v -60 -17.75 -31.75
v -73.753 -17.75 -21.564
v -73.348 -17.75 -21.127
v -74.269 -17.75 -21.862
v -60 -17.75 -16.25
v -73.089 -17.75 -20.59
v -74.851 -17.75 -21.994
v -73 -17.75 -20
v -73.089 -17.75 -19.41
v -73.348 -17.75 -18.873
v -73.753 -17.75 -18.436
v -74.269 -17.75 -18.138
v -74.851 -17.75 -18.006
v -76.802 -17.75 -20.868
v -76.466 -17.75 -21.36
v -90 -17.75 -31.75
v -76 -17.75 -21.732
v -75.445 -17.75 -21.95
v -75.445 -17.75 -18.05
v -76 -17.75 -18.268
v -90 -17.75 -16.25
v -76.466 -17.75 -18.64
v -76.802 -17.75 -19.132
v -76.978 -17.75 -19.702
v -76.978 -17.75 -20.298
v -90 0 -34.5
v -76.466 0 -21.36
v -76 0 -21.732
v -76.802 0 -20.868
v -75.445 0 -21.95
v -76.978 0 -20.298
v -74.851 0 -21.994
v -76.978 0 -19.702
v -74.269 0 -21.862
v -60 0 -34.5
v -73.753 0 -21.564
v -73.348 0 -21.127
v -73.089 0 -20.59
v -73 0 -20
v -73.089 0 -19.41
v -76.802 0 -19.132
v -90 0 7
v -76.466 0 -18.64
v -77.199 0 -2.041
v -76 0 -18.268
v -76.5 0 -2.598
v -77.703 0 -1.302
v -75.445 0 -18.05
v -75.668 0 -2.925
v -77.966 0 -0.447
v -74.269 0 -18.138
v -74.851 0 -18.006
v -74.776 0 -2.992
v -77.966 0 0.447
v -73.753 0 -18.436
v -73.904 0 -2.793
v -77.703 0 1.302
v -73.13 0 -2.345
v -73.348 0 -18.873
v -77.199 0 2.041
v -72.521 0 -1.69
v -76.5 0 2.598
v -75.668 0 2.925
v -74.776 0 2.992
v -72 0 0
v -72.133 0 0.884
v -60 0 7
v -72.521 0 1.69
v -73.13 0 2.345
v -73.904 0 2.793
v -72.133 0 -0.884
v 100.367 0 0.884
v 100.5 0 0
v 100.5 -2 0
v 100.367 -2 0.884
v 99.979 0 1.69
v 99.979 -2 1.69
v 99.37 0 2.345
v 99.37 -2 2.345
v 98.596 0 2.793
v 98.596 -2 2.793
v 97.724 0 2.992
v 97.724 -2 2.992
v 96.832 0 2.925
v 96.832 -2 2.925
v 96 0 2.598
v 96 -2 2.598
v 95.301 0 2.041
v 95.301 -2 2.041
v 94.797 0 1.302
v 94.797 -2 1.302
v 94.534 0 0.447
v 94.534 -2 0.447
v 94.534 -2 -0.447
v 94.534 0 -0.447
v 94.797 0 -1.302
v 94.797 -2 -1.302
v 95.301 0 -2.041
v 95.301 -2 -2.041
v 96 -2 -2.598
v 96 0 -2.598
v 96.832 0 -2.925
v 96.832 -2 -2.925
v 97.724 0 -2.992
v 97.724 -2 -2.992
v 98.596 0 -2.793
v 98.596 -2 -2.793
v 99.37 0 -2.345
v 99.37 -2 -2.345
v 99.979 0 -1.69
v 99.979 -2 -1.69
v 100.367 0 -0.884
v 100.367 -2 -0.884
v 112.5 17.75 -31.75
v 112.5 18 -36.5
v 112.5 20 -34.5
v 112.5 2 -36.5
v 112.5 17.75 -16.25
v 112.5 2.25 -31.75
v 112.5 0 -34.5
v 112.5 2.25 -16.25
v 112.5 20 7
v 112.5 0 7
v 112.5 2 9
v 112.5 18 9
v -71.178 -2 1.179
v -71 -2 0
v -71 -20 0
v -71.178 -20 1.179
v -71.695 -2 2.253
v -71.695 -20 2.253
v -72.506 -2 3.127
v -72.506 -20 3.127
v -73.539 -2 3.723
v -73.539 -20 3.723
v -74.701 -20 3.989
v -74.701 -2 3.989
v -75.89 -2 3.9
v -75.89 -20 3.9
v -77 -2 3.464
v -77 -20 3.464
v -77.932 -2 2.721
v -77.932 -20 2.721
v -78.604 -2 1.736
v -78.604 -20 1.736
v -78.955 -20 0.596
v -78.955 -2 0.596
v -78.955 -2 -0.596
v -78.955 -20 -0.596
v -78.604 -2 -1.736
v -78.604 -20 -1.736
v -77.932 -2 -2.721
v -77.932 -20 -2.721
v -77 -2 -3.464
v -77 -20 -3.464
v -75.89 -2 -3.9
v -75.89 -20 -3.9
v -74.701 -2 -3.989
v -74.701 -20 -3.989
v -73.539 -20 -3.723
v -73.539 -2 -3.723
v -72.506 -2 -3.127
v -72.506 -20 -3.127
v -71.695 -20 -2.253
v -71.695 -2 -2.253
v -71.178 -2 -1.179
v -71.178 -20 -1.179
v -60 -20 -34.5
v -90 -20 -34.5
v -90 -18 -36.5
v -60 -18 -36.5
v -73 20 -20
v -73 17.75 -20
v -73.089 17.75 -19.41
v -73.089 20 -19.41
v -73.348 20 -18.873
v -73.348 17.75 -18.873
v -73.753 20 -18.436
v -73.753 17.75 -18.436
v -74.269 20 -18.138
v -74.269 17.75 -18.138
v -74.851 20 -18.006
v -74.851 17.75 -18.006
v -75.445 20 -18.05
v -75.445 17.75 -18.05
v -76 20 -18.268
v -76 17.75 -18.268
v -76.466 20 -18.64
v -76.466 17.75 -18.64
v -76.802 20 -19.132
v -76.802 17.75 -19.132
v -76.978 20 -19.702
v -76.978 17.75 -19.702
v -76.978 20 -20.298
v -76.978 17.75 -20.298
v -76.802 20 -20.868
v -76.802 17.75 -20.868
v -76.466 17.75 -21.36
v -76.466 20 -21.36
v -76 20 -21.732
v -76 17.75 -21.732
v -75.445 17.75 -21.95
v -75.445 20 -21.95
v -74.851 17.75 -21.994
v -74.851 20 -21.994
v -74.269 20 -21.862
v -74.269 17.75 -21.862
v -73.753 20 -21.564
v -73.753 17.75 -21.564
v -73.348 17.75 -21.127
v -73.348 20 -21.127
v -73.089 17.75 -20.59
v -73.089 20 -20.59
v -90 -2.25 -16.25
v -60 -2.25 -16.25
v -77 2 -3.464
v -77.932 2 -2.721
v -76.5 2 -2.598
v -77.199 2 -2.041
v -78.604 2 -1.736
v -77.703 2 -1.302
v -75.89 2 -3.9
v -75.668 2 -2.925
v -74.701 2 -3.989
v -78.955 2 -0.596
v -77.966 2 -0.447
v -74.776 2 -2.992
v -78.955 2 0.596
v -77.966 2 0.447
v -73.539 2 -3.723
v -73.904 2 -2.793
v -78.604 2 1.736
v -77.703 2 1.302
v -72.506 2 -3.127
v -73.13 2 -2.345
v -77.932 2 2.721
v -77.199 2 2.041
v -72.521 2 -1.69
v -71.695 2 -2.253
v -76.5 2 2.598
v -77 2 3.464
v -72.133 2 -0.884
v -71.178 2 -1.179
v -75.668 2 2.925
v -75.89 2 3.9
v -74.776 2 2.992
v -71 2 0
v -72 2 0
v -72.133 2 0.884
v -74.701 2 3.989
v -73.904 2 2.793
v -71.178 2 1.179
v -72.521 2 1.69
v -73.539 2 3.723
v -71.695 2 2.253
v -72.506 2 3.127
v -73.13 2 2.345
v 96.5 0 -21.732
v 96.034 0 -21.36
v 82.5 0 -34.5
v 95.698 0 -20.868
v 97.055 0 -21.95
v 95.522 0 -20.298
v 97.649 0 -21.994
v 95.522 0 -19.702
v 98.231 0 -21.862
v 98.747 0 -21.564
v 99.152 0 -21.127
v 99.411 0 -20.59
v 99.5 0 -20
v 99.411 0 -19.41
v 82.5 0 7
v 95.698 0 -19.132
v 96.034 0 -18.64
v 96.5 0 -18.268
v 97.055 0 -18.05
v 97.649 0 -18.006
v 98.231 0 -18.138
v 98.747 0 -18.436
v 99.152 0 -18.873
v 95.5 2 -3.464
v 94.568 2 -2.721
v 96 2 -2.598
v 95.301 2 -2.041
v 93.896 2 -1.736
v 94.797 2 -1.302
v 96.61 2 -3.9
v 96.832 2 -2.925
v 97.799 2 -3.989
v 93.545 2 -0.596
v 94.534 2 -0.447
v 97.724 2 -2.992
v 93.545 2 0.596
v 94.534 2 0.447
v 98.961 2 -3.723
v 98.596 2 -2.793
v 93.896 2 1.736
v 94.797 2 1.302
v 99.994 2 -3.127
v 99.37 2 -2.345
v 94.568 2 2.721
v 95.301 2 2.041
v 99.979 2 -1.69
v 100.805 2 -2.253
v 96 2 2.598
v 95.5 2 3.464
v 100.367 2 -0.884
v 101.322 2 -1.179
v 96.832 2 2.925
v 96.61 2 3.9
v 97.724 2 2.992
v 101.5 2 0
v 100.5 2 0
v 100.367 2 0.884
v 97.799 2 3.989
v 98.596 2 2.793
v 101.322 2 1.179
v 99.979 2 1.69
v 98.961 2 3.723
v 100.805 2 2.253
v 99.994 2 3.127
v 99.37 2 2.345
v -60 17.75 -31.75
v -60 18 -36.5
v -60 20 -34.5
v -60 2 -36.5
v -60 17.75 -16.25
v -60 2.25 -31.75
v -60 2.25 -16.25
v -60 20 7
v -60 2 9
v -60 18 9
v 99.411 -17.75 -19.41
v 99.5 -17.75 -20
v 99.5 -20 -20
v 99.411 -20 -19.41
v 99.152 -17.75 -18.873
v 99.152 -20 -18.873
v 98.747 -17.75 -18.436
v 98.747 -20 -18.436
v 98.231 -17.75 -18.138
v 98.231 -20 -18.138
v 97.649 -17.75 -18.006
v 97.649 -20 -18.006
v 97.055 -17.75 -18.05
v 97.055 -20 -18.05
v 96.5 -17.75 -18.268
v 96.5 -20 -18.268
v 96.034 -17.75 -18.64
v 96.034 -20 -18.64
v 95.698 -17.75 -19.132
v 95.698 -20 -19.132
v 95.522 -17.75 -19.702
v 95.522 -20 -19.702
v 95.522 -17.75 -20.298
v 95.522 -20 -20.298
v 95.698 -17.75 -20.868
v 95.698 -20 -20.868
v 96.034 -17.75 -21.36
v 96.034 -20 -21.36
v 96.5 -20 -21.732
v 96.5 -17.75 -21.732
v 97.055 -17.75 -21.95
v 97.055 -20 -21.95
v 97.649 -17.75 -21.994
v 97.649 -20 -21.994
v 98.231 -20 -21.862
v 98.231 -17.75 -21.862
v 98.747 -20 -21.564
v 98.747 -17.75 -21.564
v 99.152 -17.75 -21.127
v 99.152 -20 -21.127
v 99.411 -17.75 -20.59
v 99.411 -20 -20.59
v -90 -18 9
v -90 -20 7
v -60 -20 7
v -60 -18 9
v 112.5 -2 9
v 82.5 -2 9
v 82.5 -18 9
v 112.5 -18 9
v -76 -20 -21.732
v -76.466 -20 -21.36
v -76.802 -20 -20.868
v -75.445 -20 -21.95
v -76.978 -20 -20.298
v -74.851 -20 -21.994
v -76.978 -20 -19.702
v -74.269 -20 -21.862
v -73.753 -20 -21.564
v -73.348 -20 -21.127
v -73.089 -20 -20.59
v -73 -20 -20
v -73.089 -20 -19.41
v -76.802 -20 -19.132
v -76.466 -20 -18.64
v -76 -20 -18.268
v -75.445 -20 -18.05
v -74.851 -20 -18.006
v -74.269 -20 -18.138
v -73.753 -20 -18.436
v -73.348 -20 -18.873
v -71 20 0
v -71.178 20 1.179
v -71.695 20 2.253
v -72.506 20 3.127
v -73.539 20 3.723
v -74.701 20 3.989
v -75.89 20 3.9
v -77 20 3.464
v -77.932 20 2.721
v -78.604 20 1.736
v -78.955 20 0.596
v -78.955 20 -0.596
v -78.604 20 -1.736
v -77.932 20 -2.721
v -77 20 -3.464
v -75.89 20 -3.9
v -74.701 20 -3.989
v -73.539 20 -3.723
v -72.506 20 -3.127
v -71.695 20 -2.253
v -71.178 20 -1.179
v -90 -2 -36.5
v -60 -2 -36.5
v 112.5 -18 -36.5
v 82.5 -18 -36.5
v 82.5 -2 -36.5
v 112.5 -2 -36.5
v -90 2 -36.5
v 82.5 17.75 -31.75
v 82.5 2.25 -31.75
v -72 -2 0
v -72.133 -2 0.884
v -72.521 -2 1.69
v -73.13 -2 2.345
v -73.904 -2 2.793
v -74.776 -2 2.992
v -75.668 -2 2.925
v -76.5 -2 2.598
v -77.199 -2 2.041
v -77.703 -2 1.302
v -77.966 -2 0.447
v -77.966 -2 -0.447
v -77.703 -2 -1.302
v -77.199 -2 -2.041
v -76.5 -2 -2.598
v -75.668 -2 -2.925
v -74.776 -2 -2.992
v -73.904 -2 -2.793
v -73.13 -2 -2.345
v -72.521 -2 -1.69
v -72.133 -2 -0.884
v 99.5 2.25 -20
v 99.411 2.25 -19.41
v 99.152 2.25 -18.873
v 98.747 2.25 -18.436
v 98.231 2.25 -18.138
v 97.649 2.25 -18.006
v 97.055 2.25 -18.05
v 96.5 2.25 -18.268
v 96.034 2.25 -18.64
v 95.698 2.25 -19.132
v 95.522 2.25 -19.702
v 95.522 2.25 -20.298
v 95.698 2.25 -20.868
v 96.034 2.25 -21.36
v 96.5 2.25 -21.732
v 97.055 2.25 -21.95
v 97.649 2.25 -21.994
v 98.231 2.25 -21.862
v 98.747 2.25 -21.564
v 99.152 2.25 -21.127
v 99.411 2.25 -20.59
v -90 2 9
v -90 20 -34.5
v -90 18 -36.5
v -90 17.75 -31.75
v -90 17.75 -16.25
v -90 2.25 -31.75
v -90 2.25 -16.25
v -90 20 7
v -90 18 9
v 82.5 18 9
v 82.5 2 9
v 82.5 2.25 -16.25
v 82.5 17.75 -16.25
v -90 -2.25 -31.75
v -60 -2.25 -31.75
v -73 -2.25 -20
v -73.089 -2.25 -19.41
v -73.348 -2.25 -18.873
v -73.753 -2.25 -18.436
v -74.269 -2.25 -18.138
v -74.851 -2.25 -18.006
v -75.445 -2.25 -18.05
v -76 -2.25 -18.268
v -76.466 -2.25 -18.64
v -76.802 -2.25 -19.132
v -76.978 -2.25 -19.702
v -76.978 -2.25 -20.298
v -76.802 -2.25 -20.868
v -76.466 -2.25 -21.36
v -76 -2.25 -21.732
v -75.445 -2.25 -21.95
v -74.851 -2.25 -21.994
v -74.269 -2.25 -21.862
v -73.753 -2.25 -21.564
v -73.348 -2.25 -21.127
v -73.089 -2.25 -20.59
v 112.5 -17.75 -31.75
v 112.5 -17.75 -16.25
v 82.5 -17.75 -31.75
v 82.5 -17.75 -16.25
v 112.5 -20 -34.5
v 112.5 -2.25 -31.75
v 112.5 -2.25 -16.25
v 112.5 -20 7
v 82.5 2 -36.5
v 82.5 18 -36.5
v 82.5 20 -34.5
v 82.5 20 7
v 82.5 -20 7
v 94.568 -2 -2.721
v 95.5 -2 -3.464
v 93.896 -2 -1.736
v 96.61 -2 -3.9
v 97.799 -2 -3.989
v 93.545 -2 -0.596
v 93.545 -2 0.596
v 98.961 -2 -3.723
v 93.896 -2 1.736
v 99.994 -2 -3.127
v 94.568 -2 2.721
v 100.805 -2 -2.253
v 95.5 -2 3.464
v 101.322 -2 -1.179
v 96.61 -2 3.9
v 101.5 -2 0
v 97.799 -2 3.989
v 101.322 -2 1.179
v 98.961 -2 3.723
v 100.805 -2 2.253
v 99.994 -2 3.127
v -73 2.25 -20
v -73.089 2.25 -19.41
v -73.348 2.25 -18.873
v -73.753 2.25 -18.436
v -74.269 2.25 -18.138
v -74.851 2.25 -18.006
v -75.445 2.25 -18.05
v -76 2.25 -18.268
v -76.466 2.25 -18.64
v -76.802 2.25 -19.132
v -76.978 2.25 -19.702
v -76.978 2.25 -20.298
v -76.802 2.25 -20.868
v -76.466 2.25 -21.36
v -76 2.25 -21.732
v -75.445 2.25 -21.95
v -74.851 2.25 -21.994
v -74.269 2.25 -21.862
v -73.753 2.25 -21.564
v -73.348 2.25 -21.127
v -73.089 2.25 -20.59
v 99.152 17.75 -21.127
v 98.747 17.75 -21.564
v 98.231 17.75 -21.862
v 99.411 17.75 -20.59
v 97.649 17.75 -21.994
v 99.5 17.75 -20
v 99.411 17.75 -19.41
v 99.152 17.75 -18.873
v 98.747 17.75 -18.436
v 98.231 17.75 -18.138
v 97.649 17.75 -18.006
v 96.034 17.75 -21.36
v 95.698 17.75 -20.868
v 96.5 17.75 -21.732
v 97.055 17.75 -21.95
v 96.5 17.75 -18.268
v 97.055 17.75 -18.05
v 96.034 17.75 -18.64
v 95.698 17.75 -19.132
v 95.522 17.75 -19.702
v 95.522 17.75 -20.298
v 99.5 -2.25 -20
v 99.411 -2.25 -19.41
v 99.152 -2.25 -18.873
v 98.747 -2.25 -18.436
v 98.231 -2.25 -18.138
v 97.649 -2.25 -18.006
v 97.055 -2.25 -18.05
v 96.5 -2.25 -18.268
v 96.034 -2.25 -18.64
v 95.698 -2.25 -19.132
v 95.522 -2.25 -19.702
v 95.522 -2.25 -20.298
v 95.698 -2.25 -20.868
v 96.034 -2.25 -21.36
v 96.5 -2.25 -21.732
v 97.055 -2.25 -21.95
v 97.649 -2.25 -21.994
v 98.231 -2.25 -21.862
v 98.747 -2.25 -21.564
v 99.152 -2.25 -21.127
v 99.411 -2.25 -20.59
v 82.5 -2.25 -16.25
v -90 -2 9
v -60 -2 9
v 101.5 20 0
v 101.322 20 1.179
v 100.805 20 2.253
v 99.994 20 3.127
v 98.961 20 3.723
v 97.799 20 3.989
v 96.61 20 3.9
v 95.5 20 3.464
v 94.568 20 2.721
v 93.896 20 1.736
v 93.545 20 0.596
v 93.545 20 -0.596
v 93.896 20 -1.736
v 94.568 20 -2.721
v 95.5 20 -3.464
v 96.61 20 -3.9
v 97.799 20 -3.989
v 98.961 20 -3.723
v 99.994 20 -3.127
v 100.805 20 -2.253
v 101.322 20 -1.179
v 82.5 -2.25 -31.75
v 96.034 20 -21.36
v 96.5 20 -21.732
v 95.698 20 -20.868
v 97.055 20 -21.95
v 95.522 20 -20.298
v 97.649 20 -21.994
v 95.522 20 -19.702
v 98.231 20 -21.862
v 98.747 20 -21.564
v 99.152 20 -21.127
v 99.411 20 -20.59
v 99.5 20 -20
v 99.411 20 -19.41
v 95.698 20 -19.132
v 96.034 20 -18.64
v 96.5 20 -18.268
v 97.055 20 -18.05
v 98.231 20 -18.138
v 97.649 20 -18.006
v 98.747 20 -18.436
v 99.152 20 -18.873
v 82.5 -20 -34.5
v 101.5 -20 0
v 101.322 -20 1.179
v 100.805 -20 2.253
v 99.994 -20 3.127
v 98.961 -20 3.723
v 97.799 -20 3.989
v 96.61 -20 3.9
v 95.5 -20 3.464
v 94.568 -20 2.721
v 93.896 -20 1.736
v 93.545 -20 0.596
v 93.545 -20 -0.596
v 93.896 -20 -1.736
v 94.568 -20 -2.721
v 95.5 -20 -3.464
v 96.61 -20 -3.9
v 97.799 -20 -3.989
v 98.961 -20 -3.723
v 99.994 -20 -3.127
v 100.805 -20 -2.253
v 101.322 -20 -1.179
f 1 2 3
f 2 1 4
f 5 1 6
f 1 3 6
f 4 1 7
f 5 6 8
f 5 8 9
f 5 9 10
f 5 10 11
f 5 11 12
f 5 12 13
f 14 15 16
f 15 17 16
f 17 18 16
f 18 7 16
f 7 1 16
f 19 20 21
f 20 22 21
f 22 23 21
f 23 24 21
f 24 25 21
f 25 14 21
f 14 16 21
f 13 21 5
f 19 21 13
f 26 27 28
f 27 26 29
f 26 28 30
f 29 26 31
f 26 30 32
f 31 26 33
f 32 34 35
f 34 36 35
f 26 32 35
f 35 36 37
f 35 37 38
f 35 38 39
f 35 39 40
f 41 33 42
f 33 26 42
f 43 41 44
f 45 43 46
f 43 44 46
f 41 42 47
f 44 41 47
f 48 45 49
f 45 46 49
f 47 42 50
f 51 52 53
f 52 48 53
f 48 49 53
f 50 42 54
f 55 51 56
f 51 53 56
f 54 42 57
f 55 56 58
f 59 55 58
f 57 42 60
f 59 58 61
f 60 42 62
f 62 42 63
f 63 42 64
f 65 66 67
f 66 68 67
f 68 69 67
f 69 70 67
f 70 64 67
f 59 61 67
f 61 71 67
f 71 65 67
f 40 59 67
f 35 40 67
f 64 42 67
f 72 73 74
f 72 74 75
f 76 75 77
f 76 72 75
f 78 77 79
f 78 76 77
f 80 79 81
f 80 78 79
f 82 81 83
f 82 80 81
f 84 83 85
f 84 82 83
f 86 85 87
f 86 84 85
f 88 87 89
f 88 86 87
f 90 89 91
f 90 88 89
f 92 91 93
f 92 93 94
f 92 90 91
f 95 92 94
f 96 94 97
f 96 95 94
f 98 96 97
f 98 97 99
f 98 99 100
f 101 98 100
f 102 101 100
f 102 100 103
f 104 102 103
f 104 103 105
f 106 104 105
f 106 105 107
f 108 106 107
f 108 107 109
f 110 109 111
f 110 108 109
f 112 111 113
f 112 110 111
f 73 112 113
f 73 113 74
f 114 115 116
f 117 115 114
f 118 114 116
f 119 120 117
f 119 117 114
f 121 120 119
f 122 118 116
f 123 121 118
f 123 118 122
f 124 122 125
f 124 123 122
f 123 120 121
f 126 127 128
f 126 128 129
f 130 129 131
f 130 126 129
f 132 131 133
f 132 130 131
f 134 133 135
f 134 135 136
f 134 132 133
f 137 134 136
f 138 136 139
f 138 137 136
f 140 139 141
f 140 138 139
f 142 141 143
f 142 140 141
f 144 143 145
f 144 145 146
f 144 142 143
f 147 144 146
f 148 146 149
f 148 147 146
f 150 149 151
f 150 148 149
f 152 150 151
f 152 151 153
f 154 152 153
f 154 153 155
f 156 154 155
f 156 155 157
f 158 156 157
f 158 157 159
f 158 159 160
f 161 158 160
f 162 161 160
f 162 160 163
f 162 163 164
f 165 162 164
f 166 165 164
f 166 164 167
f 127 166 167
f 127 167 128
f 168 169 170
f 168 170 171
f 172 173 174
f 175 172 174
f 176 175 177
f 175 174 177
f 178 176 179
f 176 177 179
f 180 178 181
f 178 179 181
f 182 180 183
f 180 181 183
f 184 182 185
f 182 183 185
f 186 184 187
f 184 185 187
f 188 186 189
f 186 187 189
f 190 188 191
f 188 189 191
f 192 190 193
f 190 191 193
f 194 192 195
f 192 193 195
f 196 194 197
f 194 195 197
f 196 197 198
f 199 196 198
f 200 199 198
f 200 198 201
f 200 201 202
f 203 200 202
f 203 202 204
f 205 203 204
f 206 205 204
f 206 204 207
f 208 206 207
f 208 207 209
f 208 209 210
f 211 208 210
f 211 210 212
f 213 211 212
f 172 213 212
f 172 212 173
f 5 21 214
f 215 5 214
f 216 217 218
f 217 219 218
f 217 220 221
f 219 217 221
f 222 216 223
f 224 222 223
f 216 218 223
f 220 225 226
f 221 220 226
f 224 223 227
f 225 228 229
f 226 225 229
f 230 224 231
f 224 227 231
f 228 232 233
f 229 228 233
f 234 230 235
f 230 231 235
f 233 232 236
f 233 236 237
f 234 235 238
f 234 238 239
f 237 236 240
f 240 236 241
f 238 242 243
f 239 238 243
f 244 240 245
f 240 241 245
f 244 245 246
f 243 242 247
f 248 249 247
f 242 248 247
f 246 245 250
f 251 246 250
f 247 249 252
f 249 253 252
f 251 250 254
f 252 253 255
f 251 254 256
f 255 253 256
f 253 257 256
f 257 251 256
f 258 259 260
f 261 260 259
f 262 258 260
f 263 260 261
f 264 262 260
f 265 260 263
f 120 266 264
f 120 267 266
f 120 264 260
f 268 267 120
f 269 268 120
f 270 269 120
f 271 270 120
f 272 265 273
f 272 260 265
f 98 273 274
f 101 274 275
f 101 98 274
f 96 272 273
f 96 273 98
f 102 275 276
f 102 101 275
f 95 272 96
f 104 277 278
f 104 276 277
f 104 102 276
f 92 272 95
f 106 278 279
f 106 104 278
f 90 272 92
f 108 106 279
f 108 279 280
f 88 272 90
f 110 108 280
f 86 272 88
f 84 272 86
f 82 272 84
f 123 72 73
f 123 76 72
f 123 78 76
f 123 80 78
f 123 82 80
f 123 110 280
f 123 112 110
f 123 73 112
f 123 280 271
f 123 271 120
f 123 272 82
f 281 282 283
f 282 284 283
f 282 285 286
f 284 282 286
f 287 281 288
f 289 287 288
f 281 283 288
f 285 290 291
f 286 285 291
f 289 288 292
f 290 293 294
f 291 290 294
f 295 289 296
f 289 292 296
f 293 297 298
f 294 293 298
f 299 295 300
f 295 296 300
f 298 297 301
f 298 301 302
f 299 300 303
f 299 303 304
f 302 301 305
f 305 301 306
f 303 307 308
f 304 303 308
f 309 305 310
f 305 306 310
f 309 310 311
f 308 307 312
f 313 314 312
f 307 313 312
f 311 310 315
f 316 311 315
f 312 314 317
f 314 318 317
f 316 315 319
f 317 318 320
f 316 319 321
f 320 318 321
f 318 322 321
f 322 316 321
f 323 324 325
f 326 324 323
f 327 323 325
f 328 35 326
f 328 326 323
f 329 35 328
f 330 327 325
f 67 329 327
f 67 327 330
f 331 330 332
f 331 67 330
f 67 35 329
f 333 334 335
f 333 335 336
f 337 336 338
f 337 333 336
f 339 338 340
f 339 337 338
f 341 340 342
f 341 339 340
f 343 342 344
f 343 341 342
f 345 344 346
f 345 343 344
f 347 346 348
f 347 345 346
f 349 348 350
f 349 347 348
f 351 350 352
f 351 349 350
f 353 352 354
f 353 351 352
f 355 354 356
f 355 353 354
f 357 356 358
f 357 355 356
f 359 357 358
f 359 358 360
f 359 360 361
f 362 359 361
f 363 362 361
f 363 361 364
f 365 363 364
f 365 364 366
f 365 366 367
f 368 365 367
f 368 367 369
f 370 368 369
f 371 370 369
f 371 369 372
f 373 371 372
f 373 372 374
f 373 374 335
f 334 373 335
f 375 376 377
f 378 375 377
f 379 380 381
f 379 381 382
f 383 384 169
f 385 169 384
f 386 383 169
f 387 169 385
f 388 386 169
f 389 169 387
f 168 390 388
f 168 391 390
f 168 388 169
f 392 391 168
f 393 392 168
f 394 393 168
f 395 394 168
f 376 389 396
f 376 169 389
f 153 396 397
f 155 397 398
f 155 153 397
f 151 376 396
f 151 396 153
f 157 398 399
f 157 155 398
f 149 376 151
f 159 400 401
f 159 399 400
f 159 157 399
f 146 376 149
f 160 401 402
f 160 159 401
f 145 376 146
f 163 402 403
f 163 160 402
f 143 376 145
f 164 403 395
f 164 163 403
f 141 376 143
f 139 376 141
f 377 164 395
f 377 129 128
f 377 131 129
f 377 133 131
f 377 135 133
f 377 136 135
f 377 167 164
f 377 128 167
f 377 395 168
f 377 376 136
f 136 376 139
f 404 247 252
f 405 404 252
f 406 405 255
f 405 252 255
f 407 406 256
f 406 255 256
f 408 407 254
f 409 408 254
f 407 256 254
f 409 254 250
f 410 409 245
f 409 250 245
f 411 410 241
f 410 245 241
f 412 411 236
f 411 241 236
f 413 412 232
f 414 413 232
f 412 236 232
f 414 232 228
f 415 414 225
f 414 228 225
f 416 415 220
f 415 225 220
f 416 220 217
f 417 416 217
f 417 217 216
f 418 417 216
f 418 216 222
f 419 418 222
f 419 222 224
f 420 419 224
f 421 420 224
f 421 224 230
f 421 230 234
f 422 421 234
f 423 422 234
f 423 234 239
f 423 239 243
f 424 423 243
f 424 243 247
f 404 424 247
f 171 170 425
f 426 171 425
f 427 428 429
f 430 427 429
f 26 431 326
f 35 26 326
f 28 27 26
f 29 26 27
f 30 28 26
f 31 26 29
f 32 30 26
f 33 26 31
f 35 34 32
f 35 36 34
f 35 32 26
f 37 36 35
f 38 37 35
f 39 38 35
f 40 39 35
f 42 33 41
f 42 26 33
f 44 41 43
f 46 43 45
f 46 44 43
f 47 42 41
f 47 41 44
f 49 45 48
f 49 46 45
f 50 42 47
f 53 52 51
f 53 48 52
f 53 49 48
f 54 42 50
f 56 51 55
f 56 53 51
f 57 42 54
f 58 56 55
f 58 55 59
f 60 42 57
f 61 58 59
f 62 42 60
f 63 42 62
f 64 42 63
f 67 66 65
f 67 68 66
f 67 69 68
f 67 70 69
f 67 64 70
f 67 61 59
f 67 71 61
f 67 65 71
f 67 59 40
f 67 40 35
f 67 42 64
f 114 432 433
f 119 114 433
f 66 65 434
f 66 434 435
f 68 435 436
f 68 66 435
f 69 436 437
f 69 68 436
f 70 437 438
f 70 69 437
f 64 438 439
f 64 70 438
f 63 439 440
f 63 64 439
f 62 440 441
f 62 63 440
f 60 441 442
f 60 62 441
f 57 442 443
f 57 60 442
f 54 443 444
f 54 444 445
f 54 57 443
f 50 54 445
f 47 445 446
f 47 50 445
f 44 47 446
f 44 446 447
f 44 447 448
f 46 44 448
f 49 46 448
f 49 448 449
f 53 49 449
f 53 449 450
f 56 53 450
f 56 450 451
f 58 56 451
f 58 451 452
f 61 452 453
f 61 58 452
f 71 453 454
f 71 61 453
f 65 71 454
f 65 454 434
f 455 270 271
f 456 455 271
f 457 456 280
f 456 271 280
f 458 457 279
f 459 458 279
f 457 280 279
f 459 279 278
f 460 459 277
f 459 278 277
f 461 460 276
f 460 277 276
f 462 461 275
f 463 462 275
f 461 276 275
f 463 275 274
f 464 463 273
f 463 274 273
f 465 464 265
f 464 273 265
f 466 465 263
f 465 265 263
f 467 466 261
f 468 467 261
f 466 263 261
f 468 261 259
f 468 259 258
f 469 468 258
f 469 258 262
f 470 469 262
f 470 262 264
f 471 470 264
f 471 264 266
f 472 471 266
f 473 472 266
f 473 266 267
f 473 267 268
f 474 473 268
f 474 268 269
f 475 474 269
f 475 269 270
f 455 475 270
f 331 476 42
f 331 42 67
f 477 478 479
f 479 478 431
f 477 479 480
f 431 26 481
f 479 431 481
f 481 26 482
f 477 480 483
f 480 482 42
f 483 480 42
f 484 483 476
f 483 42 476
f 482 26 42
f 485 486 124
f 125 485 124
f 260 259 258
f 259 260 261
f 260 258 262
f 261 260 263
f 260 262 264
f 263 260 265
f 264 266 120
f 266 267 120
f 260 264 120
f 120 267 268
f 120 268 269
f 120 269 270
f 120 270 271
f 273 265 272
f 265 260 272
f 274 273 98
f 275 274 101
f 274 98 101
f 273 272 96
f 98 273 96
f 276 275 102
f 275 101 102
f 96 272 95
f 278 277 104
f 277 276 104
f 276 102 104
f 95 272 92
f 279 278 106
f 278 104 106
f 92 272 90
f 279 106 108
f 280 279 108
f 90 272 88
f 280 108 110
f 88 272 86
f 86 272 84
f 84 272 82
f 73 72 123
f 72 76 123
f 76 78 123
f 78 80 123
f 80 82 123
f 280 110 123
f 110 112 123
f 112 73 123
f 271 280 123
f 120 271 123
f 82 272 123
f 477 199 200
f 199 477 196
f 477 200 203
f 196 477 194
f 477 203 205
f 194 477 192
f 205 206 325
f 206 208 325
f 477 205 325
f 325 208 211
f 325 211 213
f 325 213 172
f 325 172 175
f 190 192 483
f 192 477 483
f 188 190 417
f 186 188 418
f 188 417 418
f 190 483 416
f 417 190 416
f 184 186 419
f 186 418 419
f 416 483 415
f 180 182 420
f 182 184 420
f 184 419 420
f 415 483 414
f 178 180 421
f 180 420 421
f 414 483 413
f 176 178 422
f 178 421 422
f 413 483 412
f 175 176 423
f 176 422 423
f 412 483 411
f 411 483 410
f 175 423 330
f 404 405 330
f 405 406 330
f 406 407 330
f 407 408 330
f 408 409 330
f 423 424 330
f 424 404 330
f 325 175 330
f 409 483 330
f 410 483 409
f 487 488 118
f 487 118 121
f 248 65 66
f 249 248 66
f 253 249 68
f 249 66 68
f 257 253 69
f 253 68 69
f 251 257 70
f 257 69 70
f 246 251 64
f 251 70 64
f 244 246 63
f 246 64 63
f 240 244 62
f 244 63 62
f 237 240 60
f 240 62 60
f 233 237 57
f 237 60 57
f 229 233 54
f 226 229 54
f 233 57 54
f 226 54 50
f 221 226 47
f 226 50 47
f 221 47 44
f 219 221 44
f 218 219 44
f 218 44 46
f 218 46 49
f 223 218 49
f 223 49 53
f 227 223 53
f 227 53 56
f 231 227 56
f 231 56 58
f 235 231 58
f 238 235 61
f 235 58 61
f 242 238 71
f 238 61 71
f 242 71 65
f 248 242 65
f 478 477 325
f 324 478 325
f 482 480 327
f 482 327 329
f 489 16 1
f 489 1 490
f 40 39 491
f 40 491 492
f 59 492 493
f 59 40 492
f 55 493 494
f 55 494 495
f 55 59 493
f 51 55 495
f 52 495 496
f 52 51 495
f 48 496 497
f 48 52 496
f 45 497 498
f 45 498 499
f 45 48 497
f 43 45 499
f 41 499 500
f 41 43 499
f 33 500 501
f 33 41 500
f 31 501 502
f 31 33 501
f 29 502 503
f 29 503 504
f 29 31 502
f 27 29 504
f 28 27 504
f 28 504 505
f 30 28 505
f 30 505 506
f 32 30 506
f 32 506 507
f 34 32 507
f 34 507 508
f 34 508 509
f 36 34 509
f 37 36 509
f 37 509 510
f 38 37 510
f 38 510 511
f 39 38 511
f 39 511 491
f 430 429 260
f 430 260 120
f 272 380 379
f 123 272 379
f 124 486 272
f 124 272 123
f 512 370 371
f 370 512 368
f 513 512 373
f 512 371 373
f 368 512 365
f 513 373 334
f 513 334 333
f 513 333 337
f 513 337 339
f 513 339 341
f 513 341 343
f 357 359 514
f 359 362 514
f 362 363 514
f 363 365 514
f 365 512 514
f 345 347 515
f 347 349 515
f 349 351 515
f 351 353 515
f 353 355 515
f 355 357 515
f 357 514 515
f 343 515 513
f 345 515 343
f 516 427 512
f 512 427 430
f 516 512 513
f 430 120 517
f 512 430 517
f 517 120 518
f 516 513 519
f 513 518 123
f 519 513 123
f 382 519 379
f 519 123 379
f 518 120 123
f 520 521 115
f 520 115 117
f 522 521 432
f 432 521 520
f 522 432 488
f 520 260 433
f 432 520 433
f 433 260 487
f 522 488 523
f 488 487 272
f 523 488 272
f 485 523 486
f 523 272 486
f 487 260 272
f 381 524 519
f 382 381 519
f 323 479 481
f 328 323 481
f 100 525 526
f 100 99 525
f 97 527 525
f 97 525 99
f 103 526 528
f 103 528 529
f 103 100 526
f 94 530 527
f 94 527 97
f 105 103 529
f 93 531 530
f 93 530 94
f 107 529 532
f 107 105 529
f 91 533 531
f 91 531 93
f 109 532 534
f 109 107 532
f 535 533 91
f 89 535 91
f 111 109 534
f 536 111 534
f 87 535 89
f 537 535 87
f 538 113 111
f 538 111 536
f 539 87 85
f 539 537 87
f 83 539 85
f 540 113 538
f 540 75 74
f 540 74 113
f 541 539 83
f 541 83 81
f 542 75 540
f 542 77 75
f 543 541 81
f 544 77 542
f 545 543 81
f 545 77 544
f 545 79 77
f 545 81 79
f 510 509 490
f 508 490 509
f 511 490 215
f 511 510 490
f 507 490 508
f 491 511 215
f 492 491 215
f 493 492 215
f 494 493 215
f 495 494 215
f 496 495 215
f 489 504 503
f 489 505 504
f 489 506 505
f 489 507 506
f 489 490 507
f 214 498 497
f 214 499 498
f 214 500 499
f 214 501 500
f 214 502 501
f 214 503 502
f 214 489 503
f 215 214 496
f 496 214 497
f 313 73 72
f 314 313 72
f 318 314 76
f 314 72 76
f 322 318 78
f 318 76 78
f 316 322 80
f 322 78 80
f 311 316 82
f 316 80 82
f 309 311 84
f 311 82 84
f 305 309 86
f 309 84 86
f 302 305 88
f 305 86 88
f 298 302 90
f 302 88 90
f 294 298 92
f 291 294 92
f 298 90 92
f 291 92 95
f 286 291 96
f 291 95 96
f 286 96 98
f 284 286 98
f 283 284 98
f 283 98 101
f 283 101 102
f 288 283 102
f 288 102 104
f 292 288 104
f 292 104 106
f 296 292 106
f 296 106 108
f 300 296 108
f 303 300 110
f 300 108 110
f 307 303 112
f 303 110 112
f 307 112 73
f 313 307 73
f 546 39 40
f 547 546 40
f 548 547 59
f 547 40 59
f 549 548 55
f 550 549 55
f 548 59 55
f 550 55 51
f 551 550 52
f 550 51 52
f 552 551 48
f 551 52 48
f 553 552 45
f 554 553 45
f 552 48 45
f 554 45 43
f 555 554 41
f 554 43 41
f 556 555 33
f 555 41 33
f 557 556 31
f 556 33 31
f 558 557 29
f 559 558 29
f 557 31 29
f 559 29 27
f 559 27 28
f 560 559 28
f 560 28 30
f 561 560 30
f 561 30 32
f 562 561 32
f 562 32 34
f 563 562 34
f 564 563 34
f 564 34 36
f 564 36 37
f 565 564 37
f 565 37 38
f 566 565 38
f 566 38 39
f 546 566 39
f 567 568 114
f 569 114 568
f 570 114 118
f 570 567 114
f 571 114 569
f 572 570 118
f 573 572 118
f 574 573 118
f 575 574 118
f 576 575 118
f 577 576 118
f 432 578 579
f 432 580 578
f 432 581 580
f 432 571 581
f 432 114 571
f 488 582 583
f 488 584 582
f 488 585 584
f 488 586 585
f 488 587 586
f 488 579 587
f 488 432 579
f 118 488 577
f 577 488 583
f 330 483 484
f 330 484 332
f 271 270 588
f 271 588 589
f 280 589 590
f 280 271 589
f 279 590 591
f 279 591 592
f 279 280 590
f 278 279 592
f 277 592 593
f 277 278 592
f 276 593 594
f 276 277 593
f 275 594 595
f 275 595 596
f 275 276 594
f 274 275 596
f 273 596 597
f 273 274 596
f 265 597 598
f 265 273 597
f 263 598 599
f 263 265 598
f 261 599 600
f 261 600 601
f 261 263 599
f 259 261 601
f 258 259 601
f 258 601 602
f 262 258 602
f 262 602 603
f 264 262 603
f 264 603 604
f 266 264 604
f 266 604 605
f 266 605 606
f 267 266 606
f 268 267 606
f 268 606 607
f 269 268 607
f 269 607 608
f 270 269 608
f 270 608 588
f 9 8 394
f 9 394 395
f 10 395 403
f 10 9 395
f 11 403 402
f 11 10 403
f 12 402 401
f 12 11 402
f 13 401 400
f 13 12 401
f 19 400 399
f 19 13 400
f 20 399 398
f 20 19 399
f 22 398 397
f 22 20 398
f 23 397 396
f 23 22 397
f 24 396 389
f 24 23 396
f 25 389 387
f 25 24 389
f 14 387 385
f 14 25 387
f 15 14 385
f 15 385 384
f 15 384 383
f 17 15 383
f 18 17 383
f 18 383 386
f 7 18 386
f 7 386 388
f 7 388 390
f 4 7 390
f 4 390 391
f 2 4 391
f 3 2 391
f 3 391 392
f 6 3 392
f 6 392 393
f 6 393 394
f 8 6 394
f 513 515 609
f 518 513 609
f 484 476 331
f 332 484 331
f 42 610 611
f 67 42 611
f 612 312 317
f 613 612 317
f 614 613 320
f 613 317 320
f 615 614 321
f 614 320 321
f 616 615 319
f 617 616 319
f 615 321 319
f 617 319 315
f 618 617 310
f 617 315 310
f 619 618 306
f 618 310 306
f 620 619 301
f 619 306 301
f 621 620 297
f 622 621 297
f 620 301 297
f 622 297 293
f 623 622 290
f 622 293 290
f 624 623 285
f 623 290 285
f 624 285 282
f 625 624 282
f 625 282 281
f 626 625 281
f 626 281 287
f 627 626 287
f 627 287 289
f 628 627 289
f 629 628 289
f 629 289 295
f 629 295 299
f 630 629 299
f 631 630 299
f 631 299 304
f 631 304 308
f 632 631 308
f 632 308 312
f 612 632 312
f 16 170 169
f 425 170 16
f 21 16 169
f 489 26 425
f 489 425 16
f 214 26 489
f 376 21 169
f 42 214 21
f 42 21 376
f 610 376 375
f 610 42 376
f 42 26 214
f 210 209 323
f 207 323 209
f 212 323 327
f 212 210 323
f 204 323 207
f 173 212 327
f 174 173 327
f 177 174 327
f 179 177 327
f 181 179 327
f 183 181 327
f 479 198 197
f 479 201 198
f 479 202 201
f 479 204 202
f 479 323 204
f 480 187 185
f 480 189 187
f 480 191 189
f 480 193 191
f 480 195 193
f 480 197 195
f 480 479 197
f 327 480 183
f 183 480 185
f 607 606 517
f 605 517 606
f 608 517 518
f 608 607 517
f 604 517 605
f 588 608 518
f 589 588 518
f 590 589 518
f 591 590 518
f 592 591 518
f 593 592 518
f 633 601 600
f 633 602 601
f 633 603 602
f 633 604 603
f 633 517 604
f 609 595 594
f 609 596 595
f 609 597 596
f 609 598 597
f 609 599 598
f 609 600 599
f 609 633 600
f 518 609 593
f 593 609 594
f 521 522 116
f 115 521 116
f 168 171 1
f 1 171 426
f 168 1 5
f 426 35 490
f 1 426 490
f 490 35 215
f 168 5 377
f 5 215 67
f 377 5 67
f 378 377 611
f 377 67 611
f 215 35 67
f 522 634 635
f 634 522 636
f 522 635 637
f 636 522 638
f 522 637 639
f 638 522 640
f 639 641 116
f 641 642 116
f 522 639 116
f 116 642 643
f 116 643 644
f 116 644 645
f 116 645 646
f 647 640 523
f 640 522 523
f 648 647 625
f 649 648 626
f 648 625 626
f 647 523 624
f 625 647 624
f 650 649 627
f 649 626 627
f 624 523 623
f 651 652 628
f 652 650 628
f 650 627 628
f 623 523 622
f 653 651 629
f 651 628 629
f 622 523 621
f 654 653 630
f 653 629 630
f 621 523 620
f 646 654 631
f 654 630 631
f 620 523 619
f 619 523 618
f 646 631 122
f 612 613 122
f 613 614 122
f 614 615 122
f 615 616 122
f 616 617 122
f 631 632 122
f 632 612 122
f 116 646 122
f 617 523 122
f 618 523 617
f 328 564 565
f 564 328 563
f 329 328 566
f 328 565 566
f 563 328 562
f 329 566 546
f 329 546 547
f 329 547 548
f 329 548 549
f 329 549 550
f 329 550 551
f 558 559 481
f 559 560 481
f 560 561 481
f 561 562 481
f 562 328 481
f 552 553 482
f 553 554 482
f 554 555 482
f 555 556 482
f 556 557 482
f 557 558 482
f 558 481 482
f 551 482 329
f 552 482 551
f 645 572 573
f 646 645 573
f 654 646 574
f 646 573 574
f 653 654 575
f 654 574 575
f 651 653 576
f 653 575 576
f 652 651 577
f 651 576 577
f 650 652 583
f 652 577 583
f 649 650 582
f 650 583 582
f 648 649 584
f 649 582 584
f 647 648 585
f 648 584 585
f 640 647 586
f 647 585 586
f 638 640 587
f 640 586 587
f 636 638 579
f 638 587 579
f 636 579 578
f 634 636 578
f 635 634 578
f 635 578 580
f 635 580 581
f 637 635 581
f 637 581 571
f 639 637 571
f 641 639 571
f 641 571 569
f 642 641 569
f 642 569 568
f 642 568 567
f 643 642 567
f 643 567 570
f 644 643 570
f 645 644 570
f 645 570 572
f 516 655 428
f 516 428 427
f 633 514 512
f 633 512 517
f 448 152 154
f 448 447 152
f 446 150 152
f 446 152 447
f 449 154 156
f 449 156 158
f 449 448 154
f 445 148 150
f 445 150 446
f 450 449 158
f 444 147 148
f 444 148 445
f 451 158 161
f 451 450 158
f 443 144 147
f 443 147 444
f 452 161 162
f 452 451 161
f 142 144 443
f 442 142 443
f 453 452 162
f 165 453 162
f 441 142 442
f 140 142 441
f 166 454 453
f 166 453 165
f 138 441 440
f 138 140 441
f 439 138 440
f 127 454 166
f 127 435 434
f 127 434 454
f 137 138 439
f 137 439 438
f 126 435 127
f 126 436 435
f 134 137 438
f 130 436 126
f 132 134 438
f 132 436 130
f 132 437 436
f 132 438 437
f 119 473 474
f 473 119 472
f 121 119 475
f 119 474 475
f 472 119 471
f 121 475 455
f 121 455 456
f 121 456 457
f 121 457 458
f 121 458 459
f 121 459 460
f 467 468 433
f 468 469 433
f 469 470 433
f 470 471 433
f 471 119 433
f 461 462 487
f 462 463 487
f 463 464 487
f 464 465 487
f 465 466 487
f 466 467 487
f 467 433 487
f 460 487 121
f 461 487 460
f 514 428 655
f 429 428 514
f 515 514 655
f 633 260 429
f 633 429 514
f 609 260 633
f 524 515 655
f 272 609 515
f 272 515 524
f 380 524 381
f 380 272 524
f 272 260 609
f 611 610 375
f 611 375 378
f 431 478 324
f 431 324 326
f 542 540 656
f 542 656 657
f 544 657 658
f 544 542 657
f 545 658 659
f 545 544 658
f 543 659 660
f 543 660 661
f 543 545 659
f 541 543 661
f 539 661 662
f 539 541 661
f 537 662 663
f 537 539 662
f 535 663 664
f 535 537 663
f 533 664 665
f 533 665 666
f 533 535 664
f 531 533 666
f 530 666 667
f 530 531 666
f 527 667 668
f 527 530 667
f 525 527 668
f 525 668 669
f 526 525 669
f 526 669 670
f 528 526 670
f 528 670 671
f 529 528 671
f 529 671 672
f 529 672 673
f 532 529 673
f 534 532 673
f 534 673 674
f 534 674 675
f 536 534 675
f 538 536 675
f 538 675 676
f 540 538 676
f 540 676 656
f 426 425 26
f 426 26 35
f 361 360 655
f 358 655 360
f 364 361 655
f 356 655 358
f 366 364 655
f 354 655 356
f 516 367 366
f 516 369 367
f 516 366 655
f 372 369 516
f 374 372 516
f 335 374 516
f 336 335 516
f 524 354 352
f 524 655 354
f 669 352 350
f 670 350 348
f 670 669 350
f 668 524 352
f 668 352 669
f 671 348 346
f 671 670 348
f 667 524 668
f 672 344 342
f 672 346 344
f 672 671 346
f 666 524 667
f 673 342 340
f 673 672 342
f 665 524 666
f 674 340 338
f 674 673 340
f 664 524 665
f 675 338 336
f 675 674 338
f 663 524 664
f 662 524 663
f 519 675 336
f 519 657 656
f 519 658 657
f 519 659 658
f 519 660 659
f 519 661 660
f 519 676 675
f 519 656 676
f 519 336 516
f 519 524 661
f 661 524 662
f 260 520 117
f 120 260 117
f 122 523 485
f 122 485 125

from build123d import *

# Parameters (mm, degrees)
F0_W      = 30
F0_H      = 54
F0_R      = 2
F0_R_2    = 4
F1_DEPTH  = 20
F2_W      = 15.5
F2_H      = 15.5
F2_W_2    = 20
F2_H_2    = 8.5
F3_DEPTH  = 202.501
F0_R_3    = 3
F4_DEPTH  = 2
F5_SIZE   = 2
F5_2_SIZE = 2


with BuildPart() as f1:
    # F0 (on Front) → F1 (new body)
    with BuildSketch(Plane.XZ):
        with Locations((-75, -18)):
            Rectangle(F0_W, F0_H)
        with Locations((-75, -20)):
            Circle(F0_R, mode=Mode.SUBTRACT)
        with Locations((-75, 0)):
            Circle(F0_R_2, mode=Mode.SUBTRACT)
    extrude(amount=-F1_DEPTH)


with BuildPart() as f1b:
    # F0 (on Front) → F1, piece 2 (new body)
    with BuildSketch(Plane.XZ):
        with Locations((97.5, -18)):
            Rectangle(F0_W, F0_H)
        with Locations((97.5, -20)):
            Circle(F0_R, mode=Mode.SUBTRACT)
        with Locations((97.5, 0)):
            Circle(F0_R_2, mode=Mode.SUBTRACT)
    extrude(amount=-F1_DEPTH)


with BuildPart() as f3_tool:
    # F2 (on face) → F3 (new body, through all)
    with BuildSketch(Plane(origin=(-90, 0, 0), x_dir=(0, -1, 0), z_dir=(-1, 0, 0))):
        with Locations((-10, -24)):
            Rectangle(F2_W, F2_H)
        with Locations((-10, -40.75)):
            Rectangle(F2_W_2, F2_H_2)
    extrude(amount=-F3_DEPTH)


with BuildPart() as f1_1:
    add(f1.part)

    # F3: cut by f3_tool
    add(f3_tool.part, mode=Mode.SUBTRACT)

    # F0 (on Front) → F4, piece 2 (join)
    with BuildSketch(Plane.XZ):
        with Locations((-75, 0)):
            Circle(F0_R_2)
        with Locations((-75, 0)):
            Circle(F0_R_3, mode=Mode.SUBTRACT)
    extrude(amount=-F4_DEPTH)

    # F5
    f5_edges = [f1_1.edges().sort_by_distance(p)[0] for p in [
        (-75, 20, 9),
        (-75, 20, -36.5),
        (-75, 0, -36.5),
        (-75, 0, 9),
    ]]
    chamfer(f5_edges, length=F5_SIZE)


with BuildPart() as f1b_1:
    add(f1b.part)

    # F3: cut by f3_tool
    add(f3_tool.part, mode=Mode.SUBTRACT)

    # F0 (on Front) → F4 (join)
    with BuildSketch(Plane.XZ):
        with Locations((97.5, 0)):
            Circle(F0_R_2)
        with Locations((97.5, 0)):
            Circle(F0_R_3, mode=Mode.SUBTRACT)
    extrude(amount=-F4_DEPTH)

    # F5#2
    f5_2_edges = [f1b_1.edges().sort_by_distance(p)[0] for p in [
        (97.5, 0, 9),
        (97.5, 0, -36.5),
        (97.5, 20, 9),
        (97.5, 20, -36.5),
    ]]
    chamfer(f5_2_edges, length=F5_2_SIZE)


with BuildPart() as f6_1:
    # F6: instance of F1
    add(f1_1.part.mirror(Plane.XZ))


with BuildPart() as f6_2:
    # F6: instance of F1b
    add(f1b_1.part.mirror(Plane.XZ))


solid = Compound([f1_1.part, f1b_1.part, f6_1.part, f6_2.part])
